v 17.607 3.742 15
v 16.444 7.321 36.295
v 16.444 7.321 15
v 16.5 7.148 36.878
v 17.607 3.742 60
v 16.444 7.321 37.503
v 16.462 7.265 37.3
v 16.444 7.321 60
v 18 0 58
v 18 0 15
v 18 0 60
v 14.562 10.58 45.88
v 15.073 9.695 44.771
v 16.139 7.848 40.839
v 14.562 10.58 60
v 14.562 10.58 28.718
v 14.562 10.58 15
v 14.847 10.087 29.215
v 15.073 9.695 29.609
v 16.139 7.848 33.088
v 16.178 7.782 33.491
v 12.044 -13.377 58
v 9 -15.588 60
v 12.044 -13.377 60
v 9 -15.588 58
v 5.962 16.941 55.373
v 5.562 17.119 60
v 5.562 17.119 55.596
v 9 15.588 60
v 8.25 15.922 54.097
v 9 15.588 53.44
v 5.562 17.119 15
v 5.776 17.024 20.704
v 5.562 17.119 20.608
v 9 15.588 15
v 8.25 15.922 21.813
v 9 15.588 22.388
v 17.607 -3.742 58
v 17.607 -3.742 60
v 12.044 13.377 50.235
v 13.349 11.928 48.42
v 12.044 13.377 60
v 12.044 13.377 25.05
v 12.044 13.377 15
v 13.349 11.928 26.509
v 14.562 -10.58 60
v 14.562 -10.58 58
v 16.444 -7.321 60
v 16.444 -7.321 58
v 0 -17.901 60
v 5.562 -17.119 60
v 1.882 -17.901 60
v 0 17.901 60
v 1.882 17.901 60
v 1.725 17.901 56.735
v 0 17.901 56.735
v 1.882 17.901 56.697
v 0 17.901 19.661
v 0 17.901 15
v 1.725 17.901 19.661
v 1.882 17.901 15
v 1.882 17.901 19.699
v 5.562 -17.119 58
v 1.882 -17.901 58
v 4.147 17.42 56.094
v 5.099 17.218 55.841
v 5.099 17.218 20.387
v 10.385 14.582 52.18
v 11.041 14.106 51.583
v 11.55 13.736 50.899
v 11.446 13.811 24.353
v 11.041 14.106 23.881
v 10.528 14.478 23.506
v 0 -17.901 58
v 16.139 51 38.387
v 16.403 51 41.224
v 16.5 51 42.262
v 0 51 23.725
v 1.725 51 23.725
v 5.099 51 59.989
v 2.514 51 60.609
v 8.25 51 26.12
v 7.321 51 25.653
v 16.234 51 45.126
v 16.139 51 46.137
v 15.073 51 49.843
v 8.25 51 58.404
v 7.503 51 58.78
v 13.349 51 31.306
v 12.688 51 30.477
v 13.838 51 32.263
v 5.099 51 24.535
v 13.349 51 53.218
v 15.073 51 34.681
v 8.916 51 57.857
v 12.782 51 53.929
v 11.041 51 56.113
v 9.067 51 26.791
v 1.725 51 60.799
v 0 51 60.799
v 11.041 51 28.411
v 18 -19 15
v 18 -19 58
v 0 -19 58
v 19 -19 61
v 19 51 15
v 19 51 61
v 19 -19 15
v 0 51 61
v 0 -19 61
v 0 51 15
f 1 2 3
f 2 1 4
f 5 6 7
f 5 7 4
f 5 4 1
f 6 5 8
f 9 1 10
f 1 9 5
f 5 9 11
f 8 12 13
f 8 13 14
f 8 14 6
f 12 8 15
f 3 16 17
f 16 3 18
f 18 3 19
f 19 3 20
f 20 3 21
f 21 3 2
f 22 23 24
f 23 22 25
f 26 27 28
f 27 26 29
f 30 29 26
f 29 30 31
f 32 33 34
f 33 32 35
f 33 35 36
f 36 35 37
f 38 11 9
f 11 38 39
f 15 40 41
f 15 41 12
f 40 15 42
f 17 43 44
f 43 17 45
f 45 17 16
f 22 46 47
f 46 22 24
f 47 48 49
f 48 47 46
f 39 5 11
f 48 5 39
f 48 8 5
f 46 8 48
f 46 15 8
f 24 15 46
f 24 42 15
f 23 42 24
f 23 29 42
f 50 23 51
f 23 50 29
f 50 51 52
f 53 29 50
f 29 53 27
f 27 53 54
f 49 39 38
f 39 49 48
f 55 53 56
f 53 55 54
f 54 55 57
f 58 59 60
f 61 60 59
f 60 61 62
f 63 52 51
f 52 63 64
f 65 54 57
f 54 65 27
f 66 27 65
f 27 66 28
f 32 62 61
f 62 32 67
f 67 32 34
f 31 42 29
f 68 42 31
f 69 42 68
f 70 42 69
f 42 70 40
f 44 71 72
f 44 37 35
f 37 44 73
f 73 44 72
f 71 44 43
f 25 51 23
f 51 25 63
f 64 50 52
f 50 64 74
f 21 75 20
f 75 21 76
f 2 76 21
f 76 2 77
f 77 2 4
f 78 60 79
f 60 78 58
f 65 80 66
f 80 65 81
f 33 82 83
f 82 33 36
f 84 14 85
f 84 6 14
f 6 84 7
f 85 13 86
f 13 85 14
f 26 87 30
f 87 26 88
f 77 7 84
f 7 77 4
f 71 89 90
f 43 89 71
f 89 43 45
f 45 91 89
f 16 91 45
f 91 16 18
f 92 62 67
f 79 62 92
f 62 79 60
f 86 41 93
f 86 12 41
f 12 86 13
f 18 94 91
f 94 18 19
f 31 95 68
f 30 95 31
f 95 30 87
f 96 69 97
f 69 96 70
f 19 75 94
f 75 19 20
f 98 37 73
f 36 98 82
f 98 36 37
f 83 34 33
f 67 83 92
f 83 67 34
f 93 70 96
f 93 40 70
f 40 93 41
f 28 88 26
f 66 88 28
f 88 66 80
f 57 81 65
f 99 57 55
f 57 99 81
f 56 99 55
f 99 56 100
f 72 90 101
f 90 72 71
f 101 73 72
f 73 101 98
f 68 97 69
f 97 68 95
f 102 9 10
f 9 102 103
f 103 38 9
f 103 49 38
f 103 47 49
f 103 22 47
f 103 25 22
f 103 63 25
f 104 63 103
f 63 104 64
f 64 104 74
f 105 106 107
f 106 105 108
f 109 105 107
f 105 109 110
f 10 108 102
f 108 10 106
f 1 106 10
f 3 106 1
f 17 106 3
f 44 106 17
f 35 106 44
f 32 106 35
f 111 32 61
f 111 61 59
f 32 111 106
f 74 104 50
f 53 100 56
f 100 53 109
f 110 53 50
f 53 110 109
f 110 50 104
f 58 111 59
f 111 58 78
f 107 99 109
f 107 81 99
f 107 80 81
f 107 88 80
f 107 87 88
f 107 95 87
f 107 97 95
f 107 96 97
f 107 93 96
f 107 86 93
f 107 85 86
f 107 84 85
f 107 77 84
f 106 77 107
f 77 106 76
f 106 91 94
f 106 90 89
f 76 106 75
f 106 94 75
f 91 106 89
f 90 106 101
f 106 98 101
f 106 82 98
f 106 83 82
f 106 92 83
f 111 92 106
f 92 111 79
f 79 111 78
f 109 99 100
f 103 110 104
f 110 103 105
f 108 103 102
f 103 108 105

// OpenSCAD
stemR=18;
stemH=60;

hndlbNeckR1=18.5;
hndlbNeckR2=16.5;

//color("grey") neck();

difference() {
translate([0,-19,15]) cube([19,70,46]);
neck();
}

module neck() {
  cylinder(r=stemR,h=stemH);
  translate([0,0,stemH-hndlbNeckR1-5.5]) rotate([-90+7,0,0]) scale([hndlbNeckR2/hndlbNeckR1,1,1]) cylinder(r=hndlbNeckR1,h=70);
  translate([-stemR,-25,14]) cube([stemR*2,25,44]);
}
